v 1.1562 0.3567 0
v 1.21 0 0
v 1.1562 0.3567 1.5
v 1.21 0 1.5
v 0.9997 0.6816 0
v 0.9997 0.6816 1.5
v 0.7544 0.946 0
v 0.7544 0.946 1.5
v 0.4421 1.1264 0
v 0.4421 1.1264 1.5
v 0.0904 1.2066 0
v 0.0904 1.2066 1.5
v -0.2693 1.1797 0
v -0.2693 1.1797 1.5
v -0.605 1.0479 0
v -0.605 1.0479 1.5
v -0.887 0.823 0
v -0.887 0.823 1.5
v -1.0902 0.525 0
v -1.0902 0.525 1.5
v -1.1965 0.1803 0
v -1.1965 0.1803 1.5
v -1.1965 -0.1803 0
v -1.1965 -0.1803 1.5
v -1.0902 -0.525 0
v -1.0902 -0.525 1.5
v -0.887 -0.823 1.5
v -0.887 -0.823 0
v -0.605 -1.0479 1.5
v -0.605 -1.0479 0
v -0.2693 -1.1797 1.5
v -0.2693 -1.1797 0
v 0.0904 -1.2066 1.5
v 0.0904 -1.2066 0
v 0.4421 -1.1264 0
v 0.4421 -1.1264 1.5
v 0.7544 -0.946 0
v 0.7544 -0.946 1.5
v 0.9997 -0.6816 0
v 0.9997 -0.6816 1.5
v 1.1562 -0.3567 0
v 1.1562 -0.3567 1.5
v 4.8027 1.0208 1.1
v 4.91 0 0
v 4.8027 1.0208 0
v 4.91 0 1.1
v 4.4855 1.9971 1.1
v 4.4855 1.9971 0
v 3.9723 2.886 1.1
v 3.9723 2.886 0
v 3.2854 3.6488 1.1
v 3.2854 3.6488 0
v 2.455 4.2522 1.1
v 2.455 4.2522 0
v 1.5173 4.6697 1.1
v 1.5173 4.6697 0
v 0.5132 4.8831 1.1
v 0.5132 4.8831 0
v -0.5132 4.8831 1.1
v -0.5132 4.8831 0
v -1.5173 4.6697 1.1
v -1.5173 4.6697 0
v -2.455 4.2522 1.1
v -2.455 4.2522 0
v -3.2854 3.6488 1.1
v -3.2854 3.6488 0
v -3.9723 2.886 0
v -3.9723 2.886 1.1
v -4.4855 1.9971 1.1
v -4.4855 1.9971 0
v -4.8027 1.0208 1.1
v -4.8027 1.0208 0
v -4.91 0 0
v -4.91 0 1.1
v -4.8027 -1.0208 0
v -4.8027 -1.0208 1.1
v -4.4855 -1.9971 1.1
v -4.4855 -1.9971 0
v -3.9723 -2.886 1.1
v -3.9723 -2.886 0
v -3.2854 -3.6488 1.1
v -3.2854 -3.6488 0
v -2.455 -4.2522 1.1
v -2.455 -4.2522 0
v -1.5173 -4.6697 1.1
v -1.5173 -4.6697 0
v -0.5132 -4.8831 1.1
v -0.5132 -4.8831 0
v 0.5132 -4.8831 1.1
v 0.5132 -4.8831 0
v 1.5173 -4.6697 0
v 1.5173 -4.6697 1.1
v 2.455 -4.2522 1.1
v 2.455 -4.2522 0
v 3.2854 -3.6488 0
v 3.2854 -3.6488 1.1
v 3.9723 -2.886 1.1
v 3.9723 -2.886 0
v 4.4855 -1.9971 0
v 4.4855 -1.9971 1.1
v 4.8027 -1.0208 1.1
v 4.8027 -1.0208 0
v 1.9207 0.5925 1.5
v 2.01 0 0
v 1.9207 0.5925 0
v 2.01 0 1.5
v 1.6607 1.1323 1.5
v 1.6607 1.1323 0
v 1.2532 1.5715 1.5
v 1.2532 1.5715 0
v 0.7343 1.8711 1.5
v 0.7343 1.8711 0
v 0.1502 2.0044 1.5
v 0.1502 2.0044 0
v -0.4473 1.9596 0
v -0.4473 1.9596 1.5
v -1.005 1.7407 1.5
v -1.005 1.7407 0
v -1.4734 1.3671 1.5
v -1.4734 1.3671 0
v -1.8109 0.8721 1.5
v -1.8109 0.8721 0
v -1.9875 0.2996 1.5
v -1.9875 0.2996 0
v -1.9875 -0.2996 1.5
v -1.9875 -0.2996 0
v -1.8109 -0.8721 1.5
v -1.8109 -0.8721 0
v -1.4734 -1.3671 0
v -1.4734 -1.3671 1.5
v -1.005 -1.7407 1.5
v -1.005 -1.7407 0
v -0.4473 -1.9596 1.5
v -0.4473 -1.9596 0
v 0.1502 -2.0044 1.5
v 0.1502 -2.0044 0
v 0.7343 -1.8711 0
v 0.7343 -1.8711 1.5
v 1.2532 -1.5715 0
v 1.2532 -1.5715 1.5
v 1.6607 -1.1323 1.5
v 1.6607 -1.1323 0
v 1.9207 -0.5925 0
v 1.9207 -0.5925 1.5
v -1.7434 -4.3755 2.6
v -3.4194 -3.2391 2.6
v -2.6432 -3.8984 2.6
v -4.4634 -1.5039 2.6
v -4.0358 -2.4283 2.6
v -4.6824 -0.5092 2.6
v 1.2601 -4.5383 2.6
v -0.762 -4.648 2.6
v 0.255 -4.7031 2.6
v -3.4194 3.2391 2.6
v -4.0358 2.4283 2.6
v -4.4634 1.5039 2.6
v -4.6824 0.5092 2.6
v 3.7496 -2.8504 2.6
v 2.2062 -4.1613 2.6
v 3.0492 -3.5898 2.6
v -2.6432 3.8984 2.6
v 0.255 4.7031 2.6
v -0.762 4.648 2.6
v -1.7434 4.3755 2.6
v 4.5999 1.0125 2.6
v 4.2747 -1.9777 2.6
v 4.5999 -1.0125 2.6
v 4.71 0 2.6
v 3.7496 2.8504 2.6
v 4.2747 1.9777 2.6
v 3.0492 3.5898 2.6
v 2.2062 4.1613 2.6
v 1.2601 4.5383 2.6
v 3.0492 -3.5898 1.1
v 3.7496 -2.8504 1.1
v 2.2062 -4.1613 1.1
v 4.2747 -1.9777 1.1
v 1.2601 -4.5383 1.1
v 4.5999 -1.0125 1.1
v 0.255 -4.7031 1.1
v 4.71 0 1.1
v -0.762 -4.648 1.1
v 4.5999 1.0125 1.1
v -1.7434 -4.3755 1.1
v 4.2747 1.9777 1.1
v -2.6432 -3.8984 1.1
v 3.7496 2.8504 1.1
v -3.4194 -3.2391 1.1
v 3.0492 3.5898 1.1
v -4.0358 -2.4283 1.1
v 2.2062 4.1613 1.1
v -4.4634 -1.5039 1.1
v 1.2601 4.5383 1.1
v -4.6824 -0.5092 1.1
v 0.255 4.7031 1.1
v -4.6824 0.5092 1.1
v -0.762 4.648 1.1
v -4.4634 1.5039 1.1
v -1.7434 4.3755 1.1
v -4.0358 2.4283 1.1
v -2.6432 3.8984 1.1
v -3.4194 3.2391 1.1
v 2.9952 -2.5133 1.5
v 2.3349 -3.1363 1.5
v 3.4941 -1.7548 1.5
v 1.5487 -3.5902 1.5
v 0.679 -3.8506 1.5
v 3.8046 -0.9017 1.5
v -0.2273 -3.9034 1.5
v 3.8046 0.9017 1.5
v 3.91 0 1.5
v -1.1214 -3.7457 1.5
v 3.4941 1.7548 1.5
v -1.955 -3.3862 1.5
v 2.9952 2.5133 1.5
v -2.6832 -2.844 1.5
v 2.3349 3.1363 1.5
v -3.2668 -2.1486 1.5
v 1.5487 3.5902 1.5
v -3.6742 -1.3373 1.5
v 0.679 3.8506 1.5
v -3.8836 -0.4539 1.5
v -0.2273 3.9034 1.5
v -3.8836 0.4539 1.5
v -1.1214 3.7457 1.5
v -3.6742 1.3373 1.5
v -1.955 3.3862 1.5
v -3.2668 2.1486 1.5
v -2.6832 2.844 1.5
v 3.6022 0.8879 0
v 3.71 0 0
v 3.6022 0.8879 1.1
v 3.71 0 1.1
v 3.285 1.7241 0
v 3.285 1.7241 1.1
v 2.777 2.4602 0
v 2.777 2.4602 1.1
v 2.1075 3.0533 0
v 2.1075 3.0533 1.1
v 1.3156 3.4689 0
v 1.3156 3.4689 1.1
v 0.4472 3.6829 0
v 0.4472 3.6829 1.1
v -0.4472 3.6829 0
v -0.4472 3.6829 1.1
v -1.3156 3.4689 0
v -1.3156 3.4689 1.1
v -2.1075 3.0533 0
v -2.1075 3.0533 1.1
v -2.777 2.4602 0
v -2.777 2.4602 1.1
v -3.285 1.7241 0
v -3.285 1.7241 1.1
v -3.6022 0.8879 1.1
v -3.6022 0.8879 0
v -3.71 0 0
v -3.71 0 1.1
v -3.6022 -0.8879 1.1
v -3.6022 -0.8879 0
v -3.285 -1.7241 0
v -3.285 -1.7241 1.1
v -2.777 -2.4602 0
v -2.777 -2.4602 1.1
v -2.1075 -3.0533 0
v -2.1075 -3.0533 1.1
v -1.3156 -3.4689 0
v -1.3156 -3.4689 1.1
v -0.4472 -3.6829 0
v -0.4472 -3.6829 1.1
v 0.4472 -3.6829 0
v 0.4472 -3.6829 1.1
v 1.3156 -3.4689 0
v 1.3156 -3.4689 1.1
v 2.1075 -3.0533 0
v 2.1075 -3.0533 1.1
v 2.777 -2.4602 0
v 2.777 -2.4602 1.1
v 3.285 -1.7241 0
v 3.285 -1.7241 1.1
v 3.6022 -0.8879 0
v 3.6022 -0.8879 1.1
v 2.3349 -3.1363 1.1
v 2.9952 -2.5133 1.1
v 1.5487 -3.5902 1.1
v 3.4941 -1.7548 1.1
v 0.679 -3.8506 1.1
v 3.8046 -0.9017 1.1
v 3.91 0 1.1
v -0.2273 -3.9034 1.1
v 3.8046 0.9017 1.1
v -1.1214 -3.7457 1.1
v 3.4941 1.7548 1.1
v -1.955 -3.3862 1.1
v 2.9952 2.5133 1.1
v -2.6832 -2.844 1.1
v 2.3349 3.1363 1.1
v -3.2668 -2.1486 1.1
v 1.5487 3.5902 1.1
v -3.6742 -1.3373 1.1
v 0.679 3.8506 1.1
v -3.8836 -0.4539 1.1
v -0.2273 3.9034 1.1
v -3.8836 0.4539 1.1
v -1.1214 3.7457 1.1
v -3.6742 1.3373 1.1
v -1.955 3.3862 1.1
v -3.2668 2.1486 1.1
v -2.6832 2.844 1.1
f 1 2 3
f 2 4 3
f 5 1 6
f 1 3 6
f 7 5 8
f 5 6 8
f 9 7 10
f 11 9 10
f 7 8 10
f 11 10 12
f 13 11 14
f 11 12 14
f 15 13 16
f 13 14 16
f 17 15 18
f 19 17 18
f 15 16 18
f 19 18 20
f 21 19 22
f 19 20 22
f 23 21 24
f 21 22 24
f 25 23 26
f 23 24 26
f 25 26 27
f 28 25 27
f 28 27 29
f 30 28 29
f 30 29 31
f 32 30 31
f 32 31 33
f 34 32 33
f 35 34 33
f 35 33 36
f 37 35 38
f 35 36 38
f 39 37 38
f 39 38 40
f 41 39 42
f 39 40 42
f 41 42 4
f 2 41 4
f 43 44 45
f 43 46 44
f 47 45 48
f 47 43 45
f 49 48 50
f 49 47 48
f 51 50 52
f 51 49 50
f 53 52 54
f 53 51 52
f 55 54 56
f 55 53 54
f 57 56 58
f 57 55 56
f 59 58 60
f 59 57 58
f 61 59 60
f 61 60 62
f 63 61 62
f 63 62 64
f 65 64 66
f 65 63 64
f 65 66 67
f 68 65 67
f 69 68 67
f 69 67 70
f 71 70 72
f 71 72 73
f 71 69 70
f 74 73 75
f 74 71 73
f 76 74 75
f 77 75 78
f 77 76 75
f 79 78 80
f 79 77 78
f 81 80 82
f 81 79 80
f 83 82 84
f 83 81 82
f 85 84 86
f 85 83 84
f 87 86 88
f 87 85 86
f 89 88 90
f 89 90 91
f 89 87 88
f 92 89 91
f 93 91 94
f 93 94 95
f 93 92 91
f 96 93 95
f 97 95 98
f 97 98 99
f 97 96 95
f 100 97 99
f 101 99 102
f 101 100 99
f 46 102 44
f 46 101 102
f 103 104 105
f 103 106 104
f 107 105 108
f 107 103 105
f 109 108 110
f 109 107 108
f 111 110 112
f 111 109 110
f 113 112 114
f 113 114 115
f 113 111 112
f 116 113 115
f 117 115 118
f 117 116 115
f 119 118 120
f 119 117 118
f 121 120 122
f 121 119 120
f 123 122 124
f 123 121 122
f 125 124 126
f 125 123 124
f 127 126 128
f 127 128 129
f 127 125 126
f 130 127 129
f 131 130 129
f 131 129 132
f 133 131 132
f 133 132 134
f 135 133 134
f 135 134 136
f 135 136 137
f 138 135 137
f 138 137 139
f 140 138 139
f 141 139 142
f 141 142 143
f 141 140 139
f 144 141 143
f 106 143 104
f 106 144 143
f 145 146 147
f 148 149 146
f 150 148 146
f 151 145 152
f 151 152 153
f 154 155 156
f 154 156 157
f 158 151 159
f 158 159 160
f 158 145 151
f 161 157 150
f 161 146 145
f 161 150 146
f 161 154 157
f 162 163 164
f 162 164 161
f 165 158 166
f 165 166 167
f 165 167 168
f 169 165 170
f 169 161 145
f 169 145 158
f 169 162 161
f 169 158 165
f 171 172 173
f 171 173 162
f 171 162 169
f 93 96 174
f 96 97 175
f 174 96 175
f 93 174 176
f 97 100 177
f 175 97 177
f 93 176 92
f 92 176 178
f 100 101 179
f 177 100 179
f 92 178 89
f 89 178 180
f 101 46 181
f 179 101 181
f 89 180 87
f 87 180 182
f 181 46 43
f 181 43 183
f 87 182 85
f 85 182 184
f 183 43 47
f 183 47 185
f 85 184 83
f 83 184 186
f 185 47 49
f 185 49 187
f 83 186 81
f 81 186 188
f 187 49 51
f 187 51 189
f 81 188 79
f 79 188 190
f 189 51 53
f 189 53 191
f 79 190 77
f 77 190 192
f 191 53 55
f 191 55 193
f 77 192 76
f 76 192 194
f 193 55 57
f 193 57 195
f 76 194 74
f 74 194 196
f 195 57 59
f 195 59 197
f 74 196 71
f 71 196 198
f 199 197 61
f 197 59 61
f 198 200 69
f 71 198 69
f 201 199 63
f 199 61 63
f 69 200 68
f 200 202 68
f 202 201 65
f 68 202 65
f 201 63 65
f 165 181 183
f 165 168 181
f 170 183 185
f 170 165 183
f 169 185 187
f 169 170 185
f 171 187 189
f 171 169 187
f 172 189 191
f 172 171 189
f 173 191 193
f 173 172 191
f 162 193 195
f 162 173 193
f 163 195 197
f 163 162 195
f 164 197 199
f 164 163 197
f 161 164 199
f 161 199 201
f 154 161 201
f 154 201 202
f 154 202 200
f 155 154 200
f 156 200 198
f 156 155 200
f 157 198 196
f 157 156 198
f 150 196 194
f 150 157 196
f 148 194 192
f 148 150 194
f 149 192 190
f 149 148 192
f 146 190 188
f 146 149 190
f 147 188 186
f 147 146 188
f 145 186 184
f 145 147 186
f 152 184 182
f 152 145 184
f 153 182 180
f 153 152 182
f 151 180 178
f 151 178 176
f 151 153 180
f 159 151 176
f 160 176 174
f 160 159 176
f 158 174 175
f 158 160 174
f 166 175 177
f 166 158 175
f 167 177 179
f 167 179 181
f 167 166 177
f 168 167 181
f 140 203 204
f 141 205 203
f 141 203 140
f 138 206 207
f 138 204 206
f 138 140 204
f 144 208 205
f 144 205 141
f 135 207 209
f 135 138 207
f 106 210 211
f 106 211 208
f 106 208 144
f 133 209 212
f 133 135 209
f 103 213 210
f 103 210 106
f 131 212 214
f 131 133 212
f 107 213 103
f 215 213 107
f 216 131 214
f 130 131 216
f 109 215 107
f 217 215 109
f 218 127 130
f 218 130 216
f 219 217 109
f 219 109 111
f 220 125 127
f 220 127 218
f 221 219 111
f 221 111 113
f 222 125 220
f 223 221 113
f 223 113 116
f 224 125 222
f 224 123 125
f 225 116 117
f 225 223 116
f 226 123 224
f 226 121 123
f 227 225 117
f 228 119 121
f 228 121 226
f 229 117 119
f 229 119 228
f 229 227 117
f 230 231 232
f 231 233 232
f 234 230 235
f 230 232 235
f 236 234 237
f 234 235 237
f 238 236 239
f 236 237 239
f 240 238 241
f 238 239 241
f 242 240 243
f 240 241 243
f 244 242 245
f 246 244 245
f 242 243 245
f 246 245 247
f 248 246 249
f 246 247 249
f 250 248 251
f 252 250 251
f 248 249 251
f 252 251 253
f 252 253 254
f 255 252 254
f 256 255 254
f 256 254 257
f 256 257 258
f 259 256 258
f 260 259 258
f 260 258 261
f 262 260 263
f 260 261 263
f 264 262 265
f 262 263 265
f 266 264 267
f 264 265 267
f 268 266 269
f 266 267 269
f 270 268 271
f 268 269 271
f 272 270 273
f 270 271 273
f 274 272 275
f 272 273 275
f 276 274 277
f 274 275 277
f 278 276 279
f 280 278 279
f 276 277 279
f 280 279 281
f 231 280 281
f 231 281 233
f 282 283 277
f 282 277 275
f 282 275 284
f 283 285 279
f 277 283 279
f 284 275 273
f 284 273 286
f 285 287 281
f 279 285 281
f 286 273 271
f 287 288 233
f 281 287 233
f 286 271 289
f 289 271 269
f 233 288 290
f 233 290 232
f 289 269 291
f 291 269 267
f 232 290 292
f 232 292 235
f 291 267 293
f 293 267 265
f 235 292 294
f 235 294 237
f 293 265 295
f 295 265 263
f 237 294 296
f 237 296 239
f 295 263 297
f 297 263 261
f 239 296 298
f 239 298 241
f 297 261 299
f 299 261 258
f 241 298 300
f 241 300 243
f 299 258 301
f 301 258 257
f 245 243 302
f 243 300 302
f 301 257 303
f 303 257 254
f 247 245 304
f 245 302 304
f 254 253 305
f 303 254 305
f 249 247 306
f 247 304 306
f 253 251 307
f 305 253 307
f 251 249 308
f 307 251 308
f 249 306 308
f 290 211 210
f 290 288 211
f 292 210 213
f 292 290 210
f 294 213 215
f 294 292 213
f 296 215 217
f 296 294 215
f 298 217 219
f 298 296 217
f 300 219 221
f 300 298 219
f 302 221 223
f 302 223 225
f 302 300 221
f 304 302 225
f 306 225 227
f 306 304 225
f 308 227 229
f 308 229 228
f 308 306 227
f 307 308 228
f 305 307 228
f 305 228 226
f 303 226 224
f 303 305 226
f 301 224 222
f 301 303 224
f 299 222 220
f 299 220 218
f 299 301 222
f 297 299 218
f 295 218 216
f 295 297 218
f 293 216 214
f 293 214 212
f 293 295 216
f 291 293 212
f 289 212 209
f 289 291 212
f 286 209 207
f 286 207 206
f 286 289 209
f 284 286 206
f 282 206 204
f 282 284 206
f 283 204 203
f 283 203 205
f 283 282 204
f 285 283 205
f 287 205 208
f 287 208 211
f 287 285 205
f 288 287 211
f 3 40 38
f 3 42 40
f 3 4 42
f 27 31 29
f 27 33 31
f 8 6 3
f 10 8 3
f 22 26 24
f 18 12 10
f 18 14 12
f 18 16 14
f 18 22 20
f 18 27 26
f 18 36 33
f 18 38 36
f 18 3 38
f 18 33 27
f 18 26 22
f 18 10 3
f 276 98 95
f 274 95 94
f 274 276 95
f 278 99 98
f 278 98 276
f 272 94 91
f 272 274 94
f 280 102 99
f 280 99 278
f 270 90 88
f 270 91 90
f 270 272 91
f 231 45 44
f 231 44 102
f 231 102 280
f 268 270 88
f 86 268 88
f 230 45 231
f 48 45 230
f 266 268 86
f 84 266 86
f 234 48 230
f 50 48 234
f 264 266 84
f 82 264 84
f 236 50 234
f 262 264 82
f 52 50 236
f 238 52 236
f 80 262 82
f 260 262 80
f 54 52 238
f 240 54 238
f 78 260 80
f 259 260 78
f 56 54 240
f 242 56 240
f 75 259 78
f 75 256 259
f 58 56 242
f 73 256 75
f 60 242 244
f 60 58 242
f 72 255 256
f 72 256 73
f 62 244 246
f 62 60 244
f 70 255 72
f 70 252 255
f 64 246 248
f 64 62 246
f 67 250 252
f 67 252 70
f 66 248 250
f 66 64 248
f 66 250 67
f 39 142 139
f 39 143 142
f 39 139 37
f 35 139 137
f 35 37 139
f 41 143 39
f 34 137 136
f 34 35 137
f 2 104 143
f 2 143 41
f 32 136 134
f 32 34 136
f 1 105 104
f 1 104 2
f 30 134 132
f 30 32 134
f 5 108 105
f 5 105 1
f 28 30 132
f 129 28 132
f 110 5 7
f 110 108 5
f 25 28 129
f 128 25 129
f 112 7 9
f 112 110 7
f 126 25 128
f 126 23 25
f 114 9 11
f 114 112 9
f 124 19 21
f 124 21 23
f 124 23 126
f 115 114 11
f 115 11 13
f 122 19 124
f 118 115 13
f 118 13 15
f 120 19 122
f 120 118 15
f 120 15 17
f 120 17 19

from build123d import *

# Parameters (mm, degrees)
F0_W   = 0.2
F0_H   = 1.1
F0_W_2 = 0.8
F0_H_2 = 1.5


# Not quite as in the source:
# - a feature names something its author has since deleted; it is built from what else it names


with BuildPart() as f1:
    # F0 (on Front) → F1 (revolve)
    with BuildSketch(Plane.XZ):
        Polygon((4.71, 2.6), (0, 2.6), (0, 1.5), (1.21, 1.5), (2.01, 1.5), (3.91, 1.5), (3.91, 1.1), (3.91, 0), (4.71, 0), (4.71, 1.1), align=None)
        with Locations((4.81, 0.55)):
            Rectangle(F0_W, F0_H)
        with Locations((3.81, 0.55)):
            Rectangle(F0_W, F0_H)
        with Locations((1.61, 0.75)):
            Rectangle(F0_W_2, F0_H_2)
    revolve(axis=Axis((0, 0, 1.3), (0, 0, 1)))


solid = f1.part
